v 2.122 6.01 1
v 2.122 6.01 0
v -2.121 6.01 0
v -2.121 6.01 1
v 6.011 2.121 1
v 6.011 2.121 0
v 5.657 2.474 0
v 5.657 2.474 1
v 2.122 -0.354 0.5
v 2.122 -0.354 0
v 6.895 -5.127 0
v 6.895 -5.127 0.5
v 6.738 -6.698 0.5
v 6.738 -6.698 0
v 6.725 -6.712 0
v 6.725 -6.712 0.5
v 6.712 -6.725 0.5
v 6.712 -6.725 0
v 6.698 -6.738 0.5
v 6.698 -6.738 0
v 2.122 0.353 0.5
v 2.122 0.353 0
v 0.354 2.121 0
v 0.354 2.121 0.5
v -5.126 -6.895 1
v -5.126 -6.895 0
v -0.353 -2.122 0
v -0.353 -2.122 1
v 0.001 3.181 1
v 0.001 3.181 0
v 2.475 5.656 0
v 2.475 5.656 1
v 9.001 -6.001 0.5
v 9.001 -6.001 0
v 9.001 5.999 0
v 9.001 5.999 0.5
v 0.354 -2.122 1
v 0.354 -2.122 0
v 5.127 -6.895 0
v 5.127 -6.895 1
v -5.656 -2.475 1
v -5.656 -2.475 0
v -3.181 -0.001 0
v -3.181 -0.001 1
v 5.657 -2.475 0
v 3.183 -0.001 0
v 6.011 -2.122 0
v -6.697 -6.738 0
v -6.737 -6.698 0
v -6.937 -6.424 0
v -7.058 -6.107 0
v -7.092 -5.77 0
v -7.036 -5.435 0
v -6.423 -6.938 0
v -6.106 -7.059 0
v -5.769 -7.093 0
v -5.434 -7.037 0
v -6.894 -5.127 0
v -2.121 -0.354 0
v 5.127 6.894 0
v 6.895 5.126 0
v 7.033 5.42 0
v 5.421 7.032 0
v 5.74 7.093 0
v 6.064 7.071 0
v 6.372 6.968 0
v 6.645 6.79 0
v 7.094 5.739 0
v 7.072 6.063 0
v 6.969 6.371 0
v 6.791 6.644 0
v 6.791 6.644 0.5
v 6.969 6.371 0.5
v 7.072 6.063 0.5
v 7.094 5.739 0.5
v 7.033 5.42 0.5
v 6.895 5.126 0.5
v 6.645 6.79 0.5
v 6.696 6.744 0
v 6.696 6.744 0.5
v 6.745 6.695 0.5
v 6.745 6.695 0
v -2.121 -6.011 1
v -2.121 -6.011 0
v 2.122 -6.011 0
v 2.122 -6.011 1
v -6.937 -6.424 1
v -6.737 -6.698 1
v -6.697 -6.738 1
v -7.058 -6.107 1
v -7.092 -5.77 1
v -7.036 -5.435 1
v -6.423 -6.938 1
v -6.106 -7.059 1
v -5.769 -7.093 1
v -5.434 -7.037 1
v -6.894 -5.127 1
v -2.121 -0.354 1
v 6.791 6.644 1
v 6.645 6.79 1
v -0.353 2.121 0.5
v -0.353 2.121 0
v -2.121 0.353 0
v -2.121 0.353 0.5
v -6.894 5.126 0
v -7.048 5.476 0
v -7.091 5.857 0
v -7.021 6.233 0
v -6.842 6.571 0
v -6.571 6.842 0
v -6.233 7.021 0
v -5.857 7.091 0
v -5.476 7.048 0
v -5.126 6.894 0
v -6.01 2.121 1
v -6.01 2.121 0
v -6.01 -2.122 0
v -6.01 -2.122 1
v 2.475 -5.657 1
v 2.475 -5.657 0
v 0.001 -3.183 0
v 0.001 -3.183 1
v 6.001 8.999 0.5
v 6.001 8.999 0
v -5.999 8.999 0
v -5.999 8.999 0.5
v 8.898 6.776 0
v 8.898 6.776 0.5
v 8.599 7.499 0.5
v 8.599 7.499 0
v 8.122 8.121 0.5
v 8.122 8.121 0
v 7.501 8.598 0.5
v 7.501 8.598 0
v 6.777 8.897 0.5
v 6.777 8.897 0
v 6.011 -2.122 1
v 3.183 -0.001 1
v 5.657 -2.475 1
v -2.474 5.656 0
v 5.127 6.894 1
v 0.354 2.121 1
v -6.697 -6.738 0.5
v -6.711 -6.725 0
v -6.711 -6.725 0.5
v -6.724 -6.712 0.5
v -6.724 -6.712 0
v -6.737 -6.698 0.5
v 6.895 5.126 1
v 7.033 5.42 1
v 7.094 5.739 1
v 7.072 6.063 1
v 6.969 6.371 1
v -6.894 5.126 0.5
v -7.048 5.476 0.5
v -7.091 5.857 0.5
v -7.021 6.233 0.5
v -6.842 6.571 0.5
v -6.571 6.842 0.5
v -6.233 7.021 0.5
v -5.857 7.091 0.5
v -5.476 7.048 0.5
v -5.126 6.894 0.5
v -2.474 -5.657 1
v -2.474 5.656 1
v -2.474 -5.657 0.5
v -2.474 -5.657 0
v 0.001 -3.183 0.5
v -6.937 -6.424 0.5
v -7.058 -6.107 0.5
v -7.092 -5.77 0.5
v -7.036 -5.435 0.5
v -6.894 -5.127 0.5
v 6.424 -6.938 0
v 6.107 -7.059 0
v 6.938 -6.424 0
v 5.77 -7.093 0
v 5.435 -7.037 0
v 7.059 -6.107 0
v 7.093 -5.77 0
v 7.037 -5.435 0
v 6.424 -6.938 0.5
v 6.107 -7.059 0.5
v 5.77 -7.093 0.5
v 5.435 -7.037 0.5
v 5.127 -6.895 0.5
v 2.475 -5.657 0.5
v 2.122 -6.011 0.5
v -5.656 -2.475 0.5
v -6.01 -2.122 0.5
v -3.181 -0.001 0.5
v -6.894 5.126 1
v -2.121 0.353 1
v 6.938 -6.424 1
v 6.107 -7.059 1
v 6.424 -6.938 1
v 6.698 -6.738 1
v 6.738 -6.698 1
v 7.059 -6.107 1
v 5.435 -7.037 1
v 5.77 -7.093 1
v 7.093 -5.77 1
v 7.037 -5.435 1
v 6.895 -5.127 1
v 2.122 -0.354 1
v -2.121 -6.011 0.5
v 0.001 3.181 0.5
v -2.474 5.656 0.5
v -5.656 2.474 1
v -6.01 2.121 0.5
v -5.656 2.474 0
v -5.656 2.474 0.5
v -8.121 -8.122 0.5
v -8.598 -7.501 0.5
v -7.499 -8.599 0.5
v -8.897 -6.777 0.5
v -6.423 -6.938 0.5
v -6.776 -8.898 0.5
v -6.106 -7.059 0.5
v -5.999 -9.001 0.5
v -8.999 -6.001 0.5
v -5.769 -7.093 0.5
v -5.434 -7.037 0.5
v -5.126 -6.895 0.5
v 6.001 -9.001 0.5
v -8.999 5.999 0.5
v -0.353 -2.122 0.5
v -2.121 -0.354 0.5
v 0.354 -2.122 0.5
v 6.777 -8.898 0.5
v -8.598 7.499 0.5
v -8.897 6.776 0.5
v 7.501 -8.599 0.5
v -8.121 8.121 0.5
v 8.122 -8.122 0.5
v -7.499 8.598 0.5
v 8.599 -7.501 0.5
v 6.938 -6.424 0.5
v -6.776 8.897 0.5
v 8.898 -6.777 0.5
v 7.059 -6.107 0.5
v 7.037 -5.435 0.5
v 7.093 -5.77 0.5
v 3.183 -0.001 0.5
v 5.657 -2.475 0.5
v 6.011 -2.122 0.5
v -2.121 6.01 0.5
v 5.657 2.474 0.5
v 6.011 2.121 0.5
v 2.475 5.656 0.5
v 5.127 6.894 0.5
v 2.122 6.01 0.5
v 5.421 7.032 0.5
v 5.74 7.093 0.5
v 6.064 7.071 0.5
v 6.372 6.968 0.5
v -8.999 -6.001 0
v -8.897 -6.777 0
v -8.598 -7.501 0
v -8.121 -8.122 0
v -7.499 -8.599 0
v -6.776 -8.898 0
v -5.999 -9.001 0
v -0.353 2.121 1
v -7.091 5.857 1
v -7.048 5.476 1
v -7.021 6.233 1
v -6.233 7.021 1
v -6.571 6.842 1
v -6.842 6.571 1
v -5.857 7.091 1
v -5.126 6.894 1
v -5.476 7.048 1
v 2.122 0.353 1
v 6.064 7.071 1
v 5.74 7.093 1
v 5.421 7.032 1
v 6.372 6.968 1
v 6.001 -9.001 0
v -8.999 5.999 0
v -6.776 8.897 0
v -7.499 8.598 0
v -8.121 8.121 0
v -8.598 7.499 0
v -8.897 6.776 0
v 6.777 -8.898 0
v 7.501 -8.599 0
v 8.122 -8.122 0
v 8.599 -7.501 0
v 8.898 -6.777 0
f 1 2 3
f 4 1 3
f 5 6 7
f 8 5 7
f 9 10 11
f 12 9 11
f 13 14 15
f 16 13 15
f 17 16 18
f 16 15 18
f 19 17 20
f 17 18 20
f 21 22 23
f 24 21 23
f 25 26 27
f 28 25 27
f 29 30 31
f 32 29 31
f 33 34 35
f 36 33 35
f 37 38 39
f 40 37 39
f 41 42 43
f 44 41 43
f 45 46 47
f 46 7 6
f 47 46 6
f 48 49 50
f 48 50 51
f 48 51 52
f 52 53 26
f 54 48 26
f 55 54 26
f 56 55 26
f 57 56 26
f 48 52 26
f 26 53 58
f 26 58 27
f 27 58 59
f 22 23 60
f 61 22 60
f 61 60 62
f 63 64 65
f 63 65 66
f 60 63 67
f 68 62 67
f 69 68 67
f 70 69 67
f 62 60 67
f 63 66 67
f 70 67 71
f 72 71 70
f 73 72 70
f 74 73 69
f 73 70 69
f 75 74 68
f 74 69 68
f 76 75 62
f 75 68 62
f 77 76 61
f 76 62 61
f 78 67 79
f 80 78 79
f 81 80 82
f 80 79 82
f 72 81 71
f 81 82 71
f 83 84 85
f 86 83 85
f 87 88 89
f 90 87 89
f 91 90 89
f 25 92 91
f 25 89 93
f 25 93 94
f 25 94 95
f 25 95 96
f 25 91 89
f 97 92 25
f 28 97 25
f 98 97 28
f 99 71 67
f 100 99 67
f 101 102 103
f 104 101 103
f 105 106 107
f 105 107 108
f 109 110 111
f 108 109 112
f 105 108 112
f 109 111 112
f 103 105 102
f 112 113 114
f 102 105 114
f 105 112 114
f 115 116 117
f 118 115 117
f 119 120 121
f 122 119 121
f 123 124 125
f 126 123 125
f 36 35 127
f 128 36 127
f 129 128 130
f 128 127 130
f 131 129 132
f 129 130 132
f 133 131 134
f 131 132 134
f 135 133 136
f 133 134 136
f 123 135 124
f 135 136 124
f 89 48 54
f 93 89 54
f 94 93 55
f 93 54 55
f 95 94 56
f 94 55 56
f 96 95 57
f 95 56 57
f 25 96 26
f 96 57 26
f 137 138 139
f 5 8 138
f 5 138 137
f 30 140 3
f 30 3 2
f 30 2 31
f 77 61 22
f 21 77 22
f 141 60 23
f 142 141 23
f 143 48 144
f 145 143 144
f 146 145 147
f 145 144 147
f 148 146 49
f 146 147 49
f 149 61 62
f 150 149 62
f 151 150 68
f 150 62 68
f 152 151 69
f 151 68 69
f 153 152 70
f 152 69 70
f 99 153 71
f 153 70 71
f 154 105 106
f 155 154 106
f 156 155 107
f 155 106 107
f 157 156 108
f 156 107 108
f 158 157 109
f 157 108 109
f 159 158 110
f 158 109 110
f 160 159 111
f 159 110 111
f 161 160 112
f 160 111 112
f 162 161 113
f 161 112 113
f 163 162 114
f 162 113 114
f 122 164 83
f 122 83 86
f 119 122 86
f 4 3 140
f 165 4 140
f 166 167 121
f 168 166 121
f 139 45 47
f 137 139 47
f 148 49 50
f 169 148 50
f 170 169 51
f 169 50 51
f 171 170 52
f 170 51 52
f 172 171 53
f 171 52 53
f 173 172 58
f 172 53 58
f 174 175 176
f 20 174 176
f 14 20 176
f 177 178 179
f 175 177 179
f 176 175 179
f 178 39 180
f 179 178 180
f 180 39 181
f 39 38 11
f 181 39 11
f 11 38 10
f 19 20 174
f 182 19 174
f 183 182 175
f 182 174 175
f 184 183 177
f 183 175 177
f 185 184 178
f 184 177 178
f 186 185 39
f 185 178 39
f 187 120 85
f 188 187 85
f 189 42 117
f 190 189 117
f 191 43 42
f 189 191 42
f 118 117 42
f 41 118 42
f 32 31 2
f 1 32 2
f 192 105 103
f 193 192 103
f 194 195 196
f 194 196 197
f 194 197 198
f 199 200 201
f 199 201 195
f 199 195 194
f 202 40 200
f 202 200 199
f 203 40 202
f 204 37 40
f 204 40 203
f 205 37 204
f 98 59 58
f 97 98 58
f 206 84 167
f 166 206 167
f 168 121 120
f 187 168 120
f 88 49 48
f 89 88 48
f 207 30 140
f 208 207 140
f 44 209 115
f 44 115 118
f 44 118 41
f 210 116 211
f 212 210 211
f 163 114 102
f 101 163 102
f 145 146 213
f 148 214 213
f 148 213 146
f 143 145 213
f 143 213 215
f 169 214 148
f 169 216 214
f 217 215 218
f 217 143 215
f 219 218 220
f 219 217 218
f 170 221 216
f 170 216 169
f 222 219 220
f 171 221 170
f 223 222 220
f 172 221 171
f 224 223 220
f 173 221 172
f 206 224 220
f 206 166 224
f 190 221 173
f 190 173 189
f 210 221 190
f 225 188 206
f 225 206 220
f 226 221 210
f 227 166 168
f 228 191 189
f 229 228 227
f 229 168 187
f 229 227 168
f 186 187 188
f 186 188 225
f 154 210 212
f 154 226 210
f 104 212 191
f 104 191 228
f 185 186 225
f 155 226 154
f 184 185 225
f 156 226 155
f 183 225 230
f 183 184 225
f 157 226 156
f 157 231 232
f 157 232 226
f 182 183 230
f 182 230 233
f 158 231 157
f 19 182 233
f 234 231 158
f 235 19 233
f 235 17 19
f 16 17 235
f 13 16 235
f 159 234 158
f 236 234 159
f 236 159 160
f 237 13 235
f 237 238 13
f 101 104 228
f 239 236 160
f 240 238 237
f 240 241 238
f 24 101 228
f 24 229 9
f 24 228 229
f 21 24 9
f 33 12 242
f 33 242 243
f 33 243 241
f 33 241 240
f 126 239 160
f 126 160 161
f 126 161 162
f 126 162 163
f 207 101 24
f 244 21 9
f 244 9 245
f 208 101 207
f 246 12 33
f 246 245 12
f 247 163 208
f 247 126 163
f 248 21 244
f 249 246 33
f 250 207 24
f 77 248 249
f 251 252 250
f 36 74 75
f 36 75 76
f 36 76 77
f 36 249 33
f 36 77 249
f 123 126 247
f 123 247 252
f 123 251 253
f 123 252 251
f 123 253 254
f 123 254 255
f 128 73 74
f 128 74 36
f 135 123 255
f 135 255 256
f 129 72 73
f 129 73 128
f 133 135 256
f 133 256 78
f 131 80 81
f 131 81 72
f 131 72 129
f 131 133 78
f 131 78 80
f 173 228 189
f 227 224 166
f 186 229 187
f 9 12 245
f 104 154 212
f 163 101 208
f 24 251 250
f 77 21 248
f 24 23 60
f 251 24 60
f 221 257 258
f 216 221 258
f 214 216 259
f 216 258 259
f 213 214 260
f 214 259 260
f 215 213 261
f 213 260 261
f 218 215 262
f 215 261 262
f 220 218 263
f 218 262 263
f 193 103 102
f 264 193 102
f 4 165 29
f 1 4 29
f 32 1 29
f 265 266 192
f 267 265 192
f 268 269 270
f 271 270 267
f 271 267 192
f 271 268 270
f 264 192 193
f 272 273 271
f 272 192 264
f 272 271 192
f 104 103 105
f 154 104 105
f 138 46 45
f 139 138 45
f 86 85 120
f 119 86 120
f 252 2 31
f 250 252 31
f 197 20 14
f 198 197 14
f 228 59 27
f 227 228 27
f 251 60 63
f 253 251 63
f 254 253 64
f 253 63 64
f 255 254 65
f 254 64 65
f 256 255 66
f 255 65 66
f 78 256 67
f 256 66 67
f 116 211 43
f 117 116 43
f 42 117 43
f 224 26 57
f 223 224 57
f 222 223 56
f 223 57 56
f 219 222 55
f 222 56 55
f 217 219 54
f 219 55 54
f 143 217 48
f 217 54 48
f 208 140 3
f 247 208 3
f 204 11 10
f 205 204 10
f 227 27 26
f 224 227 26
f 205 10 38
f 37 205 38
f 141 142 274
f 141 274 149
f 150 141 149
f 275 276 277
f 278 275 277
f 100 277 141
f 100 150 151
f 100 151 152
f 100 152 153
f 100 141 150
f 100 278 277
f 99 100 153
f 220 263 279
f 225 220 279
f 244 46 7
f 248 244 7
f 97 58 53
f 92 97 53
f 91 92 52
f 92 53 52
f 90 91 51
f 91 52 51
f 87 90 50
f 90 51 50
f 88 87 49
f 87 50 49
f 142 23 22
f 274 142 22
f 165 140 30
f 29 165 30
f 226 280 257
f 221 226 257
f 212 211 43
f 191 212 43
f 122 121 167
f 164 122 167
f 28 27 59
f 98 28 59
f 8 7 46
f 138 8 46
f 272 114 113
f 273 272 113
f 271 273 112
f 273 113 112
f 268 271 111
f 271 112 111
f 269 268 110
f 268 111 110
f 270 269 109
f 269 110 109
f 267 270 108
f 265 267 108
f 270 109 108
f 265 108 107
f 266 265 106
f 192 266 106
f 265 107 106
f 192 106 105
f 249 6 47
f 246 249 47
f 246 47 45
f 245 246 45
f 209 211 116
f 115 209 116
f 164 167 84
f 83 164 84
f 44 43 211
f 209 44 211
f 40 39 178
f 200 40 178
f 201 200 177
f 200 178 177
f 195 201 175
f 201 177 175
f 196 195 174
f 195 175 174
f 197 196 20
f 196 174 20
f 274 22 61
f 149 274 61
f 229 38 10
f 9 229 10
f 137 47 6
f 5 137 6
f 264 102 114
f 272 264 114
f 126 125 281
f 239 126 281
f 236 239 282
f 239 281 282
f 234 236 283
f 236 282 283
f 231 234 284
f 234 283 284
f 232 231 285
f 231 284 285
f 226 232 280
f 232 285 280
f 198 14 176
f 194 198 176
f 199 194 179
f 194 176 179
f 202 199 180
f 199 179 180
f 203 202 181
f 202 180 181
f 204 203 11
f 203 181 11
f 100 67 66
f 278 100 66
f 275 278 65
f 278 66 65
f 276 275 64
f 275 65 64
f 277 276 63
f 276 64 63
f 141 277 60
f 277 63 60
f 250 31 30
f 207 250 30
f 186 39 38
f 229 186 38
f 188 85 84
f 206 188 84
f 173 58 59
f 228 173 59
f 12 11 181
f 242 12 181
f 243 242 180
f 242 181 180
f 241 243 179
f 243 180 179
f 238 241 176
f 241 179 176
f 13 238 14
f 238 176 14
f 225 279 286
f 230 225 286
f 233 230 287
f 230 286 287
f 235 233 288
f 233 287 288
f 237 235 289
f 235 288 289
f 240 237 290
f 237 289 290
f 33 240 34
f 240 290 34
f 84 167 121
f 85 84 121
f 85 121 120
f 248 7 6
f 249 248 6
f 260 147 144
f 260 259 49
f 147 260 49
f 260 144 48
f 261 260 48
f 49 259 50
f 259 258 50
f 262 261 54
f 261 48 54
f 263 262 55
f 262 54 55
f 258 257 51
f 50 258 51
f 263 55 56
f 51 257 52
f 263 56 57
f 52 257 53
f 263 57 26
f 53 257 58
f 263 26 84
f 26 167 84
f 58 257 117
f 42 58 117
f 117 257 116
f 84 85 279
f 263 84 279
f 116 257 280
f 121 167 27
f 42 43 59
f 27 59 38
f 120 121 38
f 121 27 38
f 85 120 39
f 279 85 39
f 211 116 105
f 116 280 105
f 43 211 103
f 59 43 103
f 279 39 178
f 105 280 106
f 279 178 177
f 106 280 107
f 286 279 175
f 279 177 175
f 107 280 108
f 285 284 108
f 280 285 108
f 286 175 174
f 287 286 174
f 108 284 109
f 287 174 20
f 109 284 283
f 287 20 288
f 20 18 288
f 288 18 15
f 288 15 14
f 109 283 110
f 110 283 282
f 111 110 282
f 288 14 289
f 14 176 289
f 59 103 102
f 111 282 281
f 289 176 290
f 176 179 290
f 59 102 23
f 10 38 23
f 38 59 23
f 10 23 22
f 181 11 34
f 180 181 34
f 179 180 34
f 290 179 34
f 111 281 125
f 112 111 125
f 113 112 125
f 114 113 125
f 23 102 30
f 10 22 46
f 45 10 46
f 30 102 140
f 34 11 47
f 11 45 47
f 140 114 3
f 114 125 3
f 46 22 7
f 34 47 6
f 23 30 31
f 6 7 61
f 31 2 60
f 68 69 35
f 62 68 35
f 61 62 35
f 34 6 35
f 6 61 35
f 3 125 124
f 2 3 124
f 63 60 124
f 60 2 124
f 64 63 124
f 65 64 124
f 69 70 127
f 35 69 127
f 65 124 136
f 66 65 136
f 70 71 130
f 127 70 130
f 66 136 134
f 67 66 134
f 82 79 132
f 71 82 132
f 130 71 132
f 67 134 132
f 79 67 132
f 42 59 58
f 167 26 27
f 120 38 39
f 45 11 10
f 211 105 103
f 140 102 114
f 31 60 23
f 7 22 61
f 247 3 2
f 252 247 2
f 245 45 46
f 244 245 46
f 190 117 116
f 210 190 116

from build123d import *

# Parameters (mm, degrees)
F1_DEPTH = 1
F2_DEPTH = 0.5


with BuildPart() as f1:
    # F0 (on Top) → F1 (new body)
    with BuildSketch(Plane.XY):
        with BuildLine():
            ThreePointArc((-5.1259953704, 6.8937408063), (-6.7168839424, 6.7168624253), (-6.8937623233, 5.1259738533))
            Line((-6.8937623233, 5.1259738533), (-2.1207915503, 0.3530030803))
            Line((-2.1207915503, 0.3530030803), (-0.3530245974, 2.1207700332))
            Line((-0.3530245974, 2.1207700332), (-5.1259953704, 6.8937408063))
        make_face()
    extrude(amount=F1_DEPTH)


with BuildPart() as f1b:
    # F0 (on Top) → F1, piece 2 (new body)
    with BuildSketch(Plane.XY):
        Polygon((-5.6563254563, -2.4754240445), (-3.1814517221, -0.0005503103), (-5.6563254563, 2.4743234238), (-6.0098788468, 2.1207700332), (-6.0098788468, -2.1218706539), align=None)
    extrude(amount=F1_DEPTH)


with BuildPart() as f1c:
    # F0 (on Top) → F1, piece 3 (new body)
    with BuildSketch(Plane.XY):
        Polygon((-2.4743449409, 5.6563039392), (0.0005287932, 3.181430205), (2.4754025274, 5.6563039392), (2.1218491368, 6.0098573298), (-2.1207915503, 6.0098573298), align=None)
    extrude(amount=F1_DEPTH)


with BuildPart() as f1d:
    # F0 (on Top) → F1, piece 4 (new body)
    with BuildSketch(Plane.XY):
        with BuildLine():
            ThreePointArc((6.6447103956, 6.7902969298), (5.9029138526, 7.0919032496), (5.1270529568, 6.8937408063))
            Line((5.1270529568, 6.8937408063), (0.3540821838, 2.1207700332))
            Line((0.3540821838, 2.1207700332), (2.1218491368, 0.3530030803))
            Line((2.1218491368, 0.3530030803), (6.8948199098, 5.1259738533))
            ThreePointArc((6.8948199098, 5.1259738533), (7.0929823531, 5.901834749), (6.7913760334, 6.6436312921))
            Line((6.7913760334, 6.6436312921), (6.6447103956, 6.7902969298))
        make_face()
    extrude(amount=F1_DEPTH)


with BuildPart() as f1e:
    # F0 (on Top) → F1, piece 5 (new body)
    with BuildSketch(Plane.XY):
        Polygon((5.6573830427, 2.4743234238), (3.1825093086, -0.0005503103), (5.6573830427, -2.4754240445), (6.0109364333, -2.1218706539), (6.0109364333, 2.1207700332), align=None)
    extrude(amount=F1_DEPTH)


with BuildPart() as f1f:
    # F0 (on Top) → F1, piece 6 (new body)
    with BuildSketch(Plane.XY):
        with BuildLine():
            ThreePointArc((5.1270529568, -6.8948414269), (5.9396456258, -7.0871866013), (6.6981563067, -6.7379516394))
            Line((6.6981563067, -6.7379516394), (6.7379301223, -6.6981778238))
            ThreePointArc((6.7379301223, -6.6981778238), (7.0871650842, -5.9396671428), (6.8948199098, -5.1270744739))
            Line((6.8948199098, -5.1270744739), (2.1218491368, -0.3541037009))
            Line((2.1218491368, -0.3541037009), (0.3540821838, -2.1218706539))
            Line((0.3540821838, -2.1218706539), (5.1270529568, -6.8948414269))
        make_face()
    extrude(amount=F1_DEPTH)


with BuildPart() as f1g:
    # F0 (on Top) → F1, piece 7 (new body)
    with BuildSketch(Plane.XY):
        Polygon((2.4754025274, -5.6574045598), (0.0005287932, -3.1825308257), (-2.4743449409, -5.6574045598), (-2.1207915503, -6.0109579504), (2.1218491368, -6.0109579504), align=None)
    extrude(amount=F1_DEPTH)


with BuildPart() as f1h:
    # F0 (on Top) → F1, piece 8 (new body)
    with BuildSketch(Plane.XY):
        with BuildLine():
            ThreePointArc((-6.8937623233, -5.1270744739), (-7.0861074977, -5.9396671428), (-6.7368725359, -6.6981778238))
            Line((-6.7368725359, -6.6981778238), (-6.6970987202, -6.7379516394))
            ThreePointArc((-6.6970987202, -6.7379516394), (-5.9385880393, -7.0871866013), (-5.1259953704, -6.8948414269))
            Line((-5.1259953704, -6.8948414269), (-0.3530245974, -2.1218706539))
            Line((-0.3530245974, -2.1218706539), (-2.1207915503, -0.3541037009))
            Line((-2.1207915503, -0.3541037009), (-6.8937623233, -5.1270744739))
        make_face()
    extrude(amount=F1_DEPTH)


with BuildPart() as f2:
    # F0 (on Top) → F2 (new body)
    with BuildSketch(Plane.XY):
        with BuildLine():
            Line((-5.9994712068, -9.0005503103), (6.0005287932, -9.0005503103))
            ThreePointArc((6.0005287932, -9.0005503103), (8.1218491368, -8.1218706539), (9.0005287932, -6.0005503103))
            Line((9.0005287932, -6.0005503103), (9.0005287932, 5.9994496897))
            ThreePointArc((9.0005287932, 5.9994496897), (8.1218491368, 8.1207700332), (6.0005287932, 8.9994496897))
            Line((6.0005287932, 8.9994496897), (-5.9994712068, 8.9994496897))
            ThreePointArc((-5.9994712068, 8.9994496897), (-8.1207915503, 8.1207700332), (-8.9994712068, 5.9994496897))
            Line((-8.9994712068, 5.9994496897), (-8.9994712068, -6.0005503103))
            ThreePointArc((-8.9994712068, -6.0005503103), (-8.1207915503, -8.1218706539), (-5.9994712068, -9.0005503103))
        make_face()
        Polygon((-2.4743449409, -5.6574045598), (0.0005287932, -3.1825308257), (2.4754025274, -5.6574045598), (2.1218491368, -6.0109579504), (-2.1207915503, -6.0109579504), align=None, mode=Mode.SUBTRACT)
        Polygon((-5.6563254563, 2.4743234238), (-3.1814517221, -0.0005503103), (-5.6563254563, -2.4754240445), (-6.0098788468, -2.1218706539), (-6.0098788468, 2.1207700332), align=None, mode=Mode.SUBTRACT)
        with BuildLine():
            ThreePointArc((-6.6970987202, -6.7379516394), (-6.7172039349, -6.7182830385), (-6.7368725359, -6.6981778238))
            ThreePointArc((-6.7368725359, -6.6981778238), (-7.0861074977, -5.9396671428), (-6.8937623233, -5.1270744739))
            Line((-6.8937623233, -5.1270744739), (-2.1207915503, -0.3541037009))
            Line((-2.1207915503, -0.3541037009), (-0.3530245974, -2.1218706539))
            Line((-0.3530245974, -2.1218706539), (-5.1259953704, -6.8948414269))
            ThreePointArc((-5.1259953704, -6.8948414269), (-5.9385880393, -7.0871866013), (-6.6970987202, -6.7379516394))
        make_face(mode=Mode.SUBTRACT)
        with BuildLine():
            ThreePointArc((6.7379301223, -6.6981778238), (6.7182615214, -6.7182830385), (6.6981563067, -6.7379516394))
            ThreePointArc((6.6981563067, -6.7379516394), (5.9396456258, -7.0871866013), (5.1270529568, -6.8948414269))
            Line((5.1270529568, -6.8948414269), (0.3540821838, -2.1218706539))
            Line((0.3540821838, -2.1218706539), (2.1218491368, -0.3541037009))
            Line((2.1218491368, -0.3541037009), (6.8948199098, -5.1270744739))
            ThreePointArc((6.8948199098, -5.1270744739), (7.0871650842, -5.9396671428), (6.7379301223, -6.6981778238))
        make_face(mode=Mode.SUBTRACT)
        with BuildLine():
            Line((-2.1207915503, 0.3530030803), (-6.8937623233, 5.1259738533))
            ThreePointArc((-6.8937623233, 5.1259738533), (-6.7168839424, 6.7168624253), (-5.1259953704, 6.8937408063))
            Line((-5.1259953704, 6.8937408063), (-0.3530245974, 2.1207700332))
            Line((-0.3530245974, 2.1207700332), (-2.1207915503, 0.3530030803))
        make_face(mode=Mode.SUBTRACT)
        Polygon((2.4754025274, 5.6563039392), (0.0005287932, 3.181430205), (-2.4743449409, 5.6563039392), (-2.1207915503, 6.0098573298), (2.1218491368, 6.0098573298), align=None, mode=Mode.SUBTRACT)
        with BuildLine():
            Line((0.3540821838, 2.1207700332), (5.1270529568, 6.8937408063))
            ThreePointArc((5.1270529568, 6.8937408063), (5.9029138526, 7.0919032496), (6.6447103956, 6.7902969298))
            ThreePointArc((6.6447103956, 6.7902969298), (6.7210187077, 6.7199396042), (6.7913760334, 6.6436312921))
            ThreePointArc((6.7913760334, 6.6436312921), (7.0929823531, 5.901834749), (6.8948199098, 5.1259738533))
            Line((6.8948199098, 5.1259738533), (2.1218491368, 0.3530030803))
            Line((2.1218491368, 0.3530030803), (0.3540821838, 2.1207700332))
        make_face(mode=Mode.SUBTRACT)
        Polygon((5.6573830427, -2.4754240445), (3.1825093086, -0.0005503103), (5.6573830427, 2.4743234238), (6.0109364333, 2.1207700332), (6.0109364333, -2.1218706539), align=None, mode=Mode.SUBTRACT)
    extrude(amount=F2_DEPTH)


solid = Compound([f1.part, f1b.part, f1c.part, f1d.part, f1e.part, f1f.part, f1g.part, f1h.part, f2.part])
